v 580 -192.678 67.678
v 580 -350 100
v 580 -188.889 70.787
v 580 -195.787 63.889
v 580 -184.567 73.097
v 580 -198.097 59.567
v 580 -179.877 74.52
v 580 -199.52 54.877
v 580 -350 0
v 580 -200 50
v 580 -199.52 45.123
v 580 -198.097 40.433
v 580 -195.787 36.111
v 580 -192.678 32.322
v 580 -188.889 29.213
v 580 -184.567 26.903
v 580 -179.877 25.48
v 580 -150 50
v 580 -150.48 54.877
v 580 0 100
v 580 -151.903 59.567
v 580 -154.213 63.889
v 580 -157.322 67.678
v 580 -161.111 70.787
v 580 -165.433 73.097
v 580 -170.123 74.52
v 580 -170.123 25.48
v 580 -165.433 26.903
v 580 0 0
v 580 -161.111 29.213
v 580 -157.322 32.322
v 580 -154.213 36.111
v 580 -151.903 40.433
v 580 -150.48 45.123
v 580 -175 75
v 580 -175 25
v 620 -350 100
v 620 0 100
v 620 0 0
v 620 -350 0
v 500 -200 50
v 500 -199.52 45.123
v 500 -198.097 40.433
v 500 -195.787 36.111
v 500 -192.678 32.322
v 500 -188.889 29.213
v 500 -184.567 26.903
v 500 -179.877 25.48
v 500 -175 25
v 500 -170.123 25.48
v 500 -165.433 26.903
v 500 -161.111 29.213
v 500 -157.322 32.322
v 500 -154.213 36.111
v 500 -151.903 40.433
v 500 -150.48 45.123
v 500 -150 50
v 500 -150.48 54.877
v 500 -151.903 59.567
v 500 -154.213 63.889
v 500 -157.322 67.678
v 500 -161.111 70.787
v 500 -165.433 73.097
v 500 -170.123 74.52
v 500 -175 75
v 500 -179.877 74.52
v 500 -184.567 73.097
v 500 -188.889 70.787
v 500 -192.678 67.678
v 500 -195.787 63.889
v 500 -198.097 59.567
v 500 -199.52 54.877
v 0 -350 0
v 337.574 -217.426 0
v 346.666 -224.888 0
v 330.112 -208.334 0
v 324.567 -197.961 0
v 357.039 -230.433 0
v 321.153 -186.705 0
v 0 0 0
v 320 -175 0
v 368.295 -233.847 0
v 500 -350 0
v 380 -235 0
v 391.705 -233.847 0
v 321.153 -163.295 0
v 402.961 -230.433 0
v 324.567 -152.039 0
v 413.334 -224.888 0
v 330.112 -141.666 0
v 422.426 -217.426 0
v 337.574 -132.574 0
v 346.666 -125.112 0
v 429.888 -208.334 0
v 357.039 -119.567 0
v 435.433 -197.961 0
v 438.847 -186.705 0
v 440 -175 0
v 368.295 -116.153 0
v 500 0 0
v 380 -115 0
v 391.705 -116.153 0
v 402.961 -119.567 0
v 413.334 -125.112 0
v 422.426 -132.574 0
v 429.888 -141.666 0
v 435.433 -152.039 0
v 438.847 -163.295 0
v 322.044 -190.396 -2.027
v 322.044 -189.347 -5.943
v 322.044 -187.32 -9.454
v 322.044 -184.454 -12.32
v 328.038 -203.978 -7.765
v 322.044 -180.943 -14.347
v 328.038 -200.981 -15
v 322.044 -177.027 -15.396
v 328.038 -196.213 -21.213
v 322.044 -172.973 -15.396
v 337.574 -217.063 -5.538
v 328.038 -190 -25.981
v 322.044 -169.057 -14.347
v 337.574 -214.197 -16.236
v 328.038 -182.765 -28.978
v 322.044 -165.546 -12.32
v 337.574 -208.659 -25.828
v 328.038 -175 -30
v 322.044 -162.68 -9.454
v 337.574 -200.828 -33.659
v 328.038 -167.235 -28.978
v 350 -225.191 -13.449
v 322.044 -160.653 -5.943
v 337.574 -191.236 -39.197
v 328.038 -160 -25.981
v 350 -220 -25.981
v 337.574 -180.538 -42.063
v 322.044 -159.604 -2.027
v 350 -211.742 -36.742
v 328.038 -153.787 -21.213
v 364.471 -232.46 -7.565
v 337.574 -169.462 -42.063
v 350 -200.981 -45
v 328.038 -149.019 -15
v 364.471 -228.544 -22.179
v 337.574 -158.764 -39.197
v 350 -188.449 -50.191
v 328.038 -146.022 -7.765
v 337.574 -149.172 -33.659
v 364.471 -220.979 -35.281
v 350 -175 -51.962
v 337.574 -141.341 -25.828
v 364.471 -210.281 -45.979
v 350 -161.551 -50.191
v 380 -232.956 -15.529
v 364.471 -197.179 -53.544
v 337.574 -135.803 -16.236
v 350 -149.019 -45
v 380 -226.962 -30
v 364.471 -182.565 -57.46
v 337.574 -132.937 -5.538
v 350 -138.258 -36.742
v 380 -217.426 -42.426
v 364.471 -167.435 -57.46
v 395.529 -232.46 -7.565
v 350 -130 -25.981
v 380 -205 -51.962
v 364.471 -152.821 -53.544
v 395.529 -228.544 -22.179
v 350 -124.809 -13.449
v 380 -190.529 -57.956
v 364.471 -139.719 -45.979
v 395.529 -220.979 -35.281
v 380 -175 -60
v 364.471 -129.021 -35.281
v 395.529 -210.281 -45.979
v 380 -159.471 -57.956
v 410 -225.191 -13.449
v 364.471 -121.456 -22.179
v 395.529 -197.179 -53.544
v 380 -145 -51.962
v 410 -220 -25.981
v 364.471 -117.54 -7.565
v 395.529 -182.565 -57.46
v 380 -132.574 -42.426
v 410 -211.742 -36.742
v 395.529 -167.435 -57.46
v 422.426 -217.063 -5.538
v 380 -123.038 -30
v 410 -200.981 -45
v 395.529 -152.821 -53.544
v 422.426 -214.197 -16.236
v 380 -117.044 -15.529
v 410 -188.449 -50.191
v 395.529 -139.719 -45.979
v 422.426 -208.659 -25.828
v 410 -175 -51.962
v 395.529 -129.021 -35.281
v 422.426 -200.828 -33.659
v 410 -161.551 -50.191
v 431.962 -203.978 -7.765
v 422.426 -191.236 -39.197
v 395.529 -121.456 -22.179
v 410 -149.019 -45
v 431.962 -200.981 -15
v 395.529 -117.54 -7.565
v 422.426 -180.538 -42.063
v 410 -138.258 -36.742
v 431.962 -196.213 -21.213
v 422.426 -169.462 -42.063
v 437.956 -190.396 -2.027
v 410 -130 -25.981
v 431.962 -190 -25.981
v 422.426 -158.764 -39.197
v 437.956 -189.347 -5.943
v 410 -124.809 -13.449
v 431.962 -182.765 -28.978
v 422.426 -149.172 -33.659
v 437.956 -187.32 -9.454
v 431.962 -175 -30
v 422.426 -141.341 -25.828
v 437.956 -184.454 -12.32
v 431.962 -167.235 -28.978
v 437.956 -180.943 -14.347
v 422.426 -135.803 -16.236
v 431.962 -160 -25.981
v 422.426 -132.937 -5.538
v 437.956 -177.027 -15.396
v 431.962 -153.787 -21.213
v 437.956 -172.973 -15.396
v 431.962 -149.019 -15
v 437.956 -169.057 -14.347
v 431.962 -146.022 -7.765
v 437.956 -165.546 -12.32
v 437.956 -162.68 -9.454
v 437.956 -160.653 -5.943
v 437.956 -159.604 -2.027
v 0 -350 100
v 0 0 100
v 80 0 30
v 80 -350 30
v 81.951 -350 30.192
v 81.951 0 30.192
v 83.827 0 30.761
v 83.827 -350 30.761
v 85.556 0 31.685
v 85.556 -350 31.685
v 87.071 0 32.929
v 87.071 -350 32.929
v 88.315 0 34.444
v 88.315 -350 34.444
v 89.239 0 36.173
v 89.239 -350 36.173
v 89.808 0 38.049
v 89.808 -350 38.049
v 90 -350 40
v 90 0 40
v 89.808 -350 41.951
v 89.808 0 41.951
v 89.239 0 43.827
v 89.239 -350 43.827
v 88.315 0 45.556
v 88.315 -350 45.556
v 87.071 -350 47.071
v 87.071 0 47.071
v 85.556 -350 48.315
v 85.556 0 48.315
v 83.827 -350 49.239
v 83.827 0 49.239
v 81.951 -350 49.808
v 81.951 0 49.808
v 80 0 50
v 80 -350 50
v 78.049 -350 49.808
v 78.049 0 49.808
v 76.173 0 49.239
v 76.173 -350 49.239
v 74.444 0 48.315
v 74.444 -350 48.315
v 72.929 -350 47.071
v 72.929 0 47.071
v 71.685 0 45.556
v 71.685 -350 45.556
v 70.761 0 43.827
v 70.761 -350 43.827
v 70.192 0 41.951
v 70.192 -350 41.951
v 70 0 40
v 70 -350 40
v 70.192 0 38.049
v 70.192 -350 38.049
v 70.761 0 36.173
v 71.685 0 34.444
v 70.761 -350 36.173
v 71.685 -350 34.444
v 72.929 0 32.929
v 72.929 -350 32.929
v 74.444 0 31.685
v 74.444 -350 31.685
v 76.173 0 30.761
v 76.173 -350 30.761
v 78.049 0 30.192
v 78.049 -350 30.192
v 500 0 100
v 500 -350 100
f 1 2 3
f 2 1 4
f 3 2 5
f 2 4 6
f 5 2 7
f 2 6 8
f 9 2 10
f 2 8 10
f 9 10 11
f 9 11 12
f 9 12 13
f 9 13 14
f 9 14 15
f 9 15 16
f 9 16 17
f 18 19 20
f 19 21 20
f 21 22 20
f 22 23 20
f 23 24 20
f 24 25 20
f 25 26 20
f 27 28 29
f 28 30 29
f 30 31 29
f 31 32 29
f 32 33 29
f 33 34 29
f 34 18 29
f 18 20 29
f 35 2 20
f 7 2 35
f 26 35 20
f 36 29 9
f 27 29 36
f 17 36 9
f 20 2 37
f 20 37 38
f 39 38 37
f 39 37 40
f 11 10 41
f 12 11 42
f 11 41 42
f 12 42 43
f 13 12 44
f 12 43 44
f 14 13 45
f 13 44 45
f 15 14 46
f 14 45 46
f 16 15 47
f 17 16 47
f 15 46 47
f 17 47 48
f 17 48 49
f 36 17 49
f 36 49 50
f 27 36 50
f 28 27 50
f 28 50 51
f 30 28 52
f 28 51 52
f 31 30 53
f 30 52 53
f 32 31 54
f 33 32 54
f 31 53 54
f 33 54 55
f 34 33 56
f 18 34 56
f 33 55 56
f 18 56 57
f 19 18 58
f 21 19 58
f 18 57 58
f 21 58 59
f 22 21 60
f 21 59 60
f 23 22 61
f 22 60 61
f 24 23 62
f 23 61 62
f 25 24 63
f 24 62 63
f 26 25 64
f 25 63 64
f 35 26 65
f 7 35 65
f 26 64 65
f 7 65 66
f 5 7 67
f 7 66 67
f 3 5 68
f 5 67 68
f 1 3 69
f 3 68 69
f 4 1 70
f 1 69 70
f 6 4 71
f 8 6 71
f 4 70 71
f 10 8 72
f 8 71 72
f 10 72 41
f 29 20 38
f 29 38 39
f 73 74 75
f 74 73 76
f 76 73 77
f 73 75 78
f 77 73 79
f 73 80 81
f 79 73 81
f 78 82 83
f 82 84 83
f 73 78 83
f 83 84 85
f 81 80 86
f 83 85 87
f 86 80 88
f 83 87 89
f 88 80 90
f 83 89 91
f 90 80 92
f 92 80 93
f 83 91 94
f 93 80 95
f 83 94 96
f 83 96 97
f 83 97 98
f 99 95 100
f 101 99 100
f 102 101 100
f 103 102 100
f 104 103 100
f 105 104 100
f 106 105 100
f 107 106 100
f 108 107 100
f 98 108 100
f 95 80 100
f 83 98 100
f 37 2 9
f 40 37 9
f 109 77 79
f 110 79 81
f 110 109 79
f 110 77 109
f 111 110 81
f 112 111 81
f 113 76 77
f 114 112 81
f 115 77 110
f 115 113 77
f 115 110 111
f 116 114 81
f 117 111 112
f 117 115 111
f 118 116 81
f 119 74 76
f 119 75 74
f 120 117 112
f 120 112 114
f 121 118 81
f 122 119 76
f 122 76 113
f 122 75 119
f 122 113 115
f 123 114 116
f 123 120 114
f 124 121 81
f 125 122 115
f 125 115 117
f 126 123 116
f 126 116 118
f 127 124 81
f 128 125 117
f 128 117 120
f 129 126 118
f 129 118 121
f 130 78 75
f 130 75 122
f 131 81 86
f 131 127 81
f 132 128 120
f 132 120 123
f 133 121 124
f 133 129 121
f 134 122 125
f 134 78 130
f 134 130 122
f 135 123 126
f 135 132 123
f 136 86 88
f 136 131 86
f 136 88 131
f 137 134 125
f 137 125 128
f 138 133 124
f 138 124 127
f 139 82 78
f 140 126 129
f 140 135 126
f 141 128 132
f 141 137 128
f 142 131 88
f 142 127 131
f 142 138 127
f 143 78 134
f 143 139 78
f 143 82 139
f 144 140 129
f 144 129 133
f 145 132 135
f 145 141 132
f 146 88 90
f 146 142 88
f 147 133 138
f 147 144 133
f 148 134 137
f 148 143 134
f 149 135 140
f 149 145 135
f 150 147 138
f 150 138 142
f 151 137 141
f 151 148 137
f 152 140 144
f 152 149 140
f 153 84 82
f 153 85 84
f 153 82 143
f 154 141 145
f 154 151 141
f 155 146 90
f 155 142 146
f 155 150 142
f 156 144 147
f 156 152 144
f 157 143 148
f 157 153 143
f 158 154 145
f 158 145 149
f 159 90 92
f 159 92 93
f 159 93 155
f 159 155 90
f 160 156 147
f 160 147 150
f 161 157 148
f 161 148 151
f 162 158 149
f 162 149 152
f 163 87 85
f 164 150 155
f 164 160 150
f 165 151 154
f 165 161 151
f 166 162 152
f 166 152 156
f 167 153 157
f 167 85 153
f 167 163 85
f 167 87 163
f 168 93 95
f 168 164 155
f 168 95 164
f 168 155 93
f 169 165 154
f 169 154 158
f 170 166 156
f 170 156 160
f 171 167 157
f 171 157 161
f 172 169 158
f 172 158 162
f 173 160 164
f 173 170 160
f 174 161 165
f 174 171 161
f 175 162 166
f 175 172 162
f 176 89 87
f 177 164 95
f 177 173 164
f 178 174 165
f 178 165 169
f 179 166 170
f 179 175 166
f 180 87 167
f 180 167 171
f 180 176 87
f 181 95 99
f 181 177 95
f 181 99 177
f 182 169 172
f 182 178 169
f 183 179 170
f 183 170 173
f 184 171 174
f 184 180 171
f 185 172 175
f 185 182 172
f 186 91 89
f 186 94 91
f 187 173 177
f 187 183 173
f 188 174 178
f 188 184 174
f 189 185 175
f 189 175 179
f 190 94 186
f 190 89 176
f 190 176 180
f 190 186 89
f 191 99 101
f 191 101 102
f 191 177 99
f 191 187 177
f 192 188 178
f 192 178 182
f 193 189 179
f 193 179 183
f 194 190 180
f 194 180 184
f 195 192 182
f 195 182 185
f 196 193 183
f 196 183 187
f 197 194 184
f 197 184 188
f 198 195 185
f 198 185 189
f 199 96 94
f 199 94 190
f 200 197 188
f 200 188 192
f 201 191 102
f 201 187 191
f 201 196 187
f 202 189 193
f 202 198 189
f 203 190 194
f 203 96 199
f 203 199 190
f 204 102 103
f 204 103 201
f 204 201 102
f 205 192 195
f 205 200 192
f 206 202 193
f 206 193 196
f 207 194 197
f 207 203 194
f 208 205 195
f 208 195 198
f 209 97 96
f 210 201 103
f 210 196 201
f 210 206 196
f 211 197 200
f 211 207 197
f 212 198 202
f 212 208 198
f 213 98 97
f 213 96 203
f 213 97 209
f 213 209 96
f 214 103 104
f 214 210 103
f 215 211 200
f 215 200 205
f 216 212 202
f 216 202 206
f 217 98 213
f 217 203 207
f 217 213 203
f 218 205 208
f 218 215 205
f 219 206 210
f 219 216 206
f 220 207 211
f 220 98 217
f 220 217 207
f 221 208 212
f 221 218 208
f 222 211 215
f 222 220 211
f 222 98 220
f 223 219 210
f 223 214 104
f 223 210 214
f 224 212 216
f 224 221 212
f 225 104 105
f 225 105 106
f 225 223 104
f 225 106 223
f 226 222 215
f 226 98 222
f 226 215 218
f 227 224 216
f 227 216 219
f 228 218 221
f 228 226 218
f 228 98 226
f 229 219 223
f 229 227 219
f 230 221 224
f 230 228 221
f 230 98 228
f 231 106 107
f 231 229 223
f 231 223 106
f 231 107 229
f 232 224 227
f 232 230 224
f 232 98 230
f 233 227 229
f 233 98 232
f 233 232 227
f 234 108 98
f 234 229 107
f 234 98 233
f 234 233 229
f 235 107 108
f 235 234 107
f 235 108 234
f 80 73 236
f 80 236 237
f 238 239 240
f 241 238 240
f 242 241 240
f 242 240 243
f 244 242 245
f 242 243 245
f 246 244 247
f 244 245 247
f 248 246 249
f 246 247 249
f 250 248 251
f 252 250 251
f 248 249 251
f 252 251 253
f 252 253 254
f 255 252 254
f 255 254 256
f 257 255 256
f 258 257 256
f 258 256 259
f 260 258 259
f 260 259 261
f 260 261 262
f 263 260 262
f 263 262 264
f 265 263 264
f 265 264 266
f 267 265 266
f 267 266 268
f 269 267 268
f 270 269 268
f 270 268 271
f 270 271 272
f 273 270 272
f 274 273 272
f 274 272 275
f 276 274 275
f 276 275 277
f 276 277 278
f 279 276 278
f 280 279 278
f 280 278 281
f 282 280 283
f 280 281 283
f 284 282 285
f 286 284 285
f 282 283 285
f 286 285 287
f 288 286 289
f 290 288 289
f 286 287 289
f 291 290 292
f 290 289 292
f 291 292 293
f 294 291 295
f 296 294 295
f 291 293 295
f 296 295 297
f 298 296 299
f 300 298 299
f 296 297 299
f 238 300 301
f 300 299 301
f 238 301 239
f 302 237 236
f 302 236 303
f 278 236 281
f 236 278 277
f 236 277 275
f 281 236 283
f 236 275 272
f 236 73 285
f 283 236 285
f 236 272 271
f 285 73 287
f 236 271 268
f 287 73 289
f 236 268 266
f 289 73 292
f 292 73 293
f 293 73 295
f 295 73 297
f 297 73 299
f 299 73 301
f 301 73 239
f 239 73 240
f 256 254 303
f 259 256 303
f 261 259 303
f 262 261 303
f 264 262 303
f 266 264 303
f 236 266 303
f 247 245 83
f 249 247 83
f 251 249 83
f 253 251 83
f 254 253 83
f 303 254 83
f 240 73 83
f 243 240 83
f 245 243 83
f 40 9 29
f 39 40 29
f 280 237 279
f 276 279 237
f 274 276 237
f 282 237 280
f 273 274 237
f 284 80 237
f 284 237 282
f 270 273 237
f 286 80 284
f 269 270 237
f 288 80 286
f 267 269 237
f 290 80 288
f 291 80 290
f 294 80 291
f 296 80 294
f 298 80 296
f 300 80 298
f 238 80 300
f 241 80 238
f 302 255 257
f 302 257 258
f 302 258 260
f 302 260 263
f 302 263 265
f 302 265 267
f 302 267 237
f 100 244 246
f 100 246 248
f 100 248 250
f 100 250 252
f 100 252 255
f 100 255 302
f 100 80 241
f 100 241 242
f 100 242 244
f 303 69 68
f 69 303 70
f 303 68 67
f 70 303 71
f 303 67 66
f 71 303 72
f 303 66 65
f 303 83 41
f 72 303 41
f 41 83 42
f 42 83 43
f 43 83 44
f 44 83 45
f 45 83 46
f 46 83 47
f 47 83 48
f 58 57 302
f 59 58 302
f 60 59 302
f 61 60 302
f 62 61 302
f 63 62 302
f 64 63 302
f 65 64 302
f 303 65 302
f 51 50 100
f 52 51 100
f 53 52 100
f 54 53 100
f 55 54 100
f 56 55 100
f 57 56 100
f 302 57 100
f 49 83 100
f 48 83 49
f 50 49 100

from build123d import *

# Parameters (mm, degrees)
SKETCH1_W           = 500
SKETCH1_H           = 350
BOSS_EXTRUDE1_DEPTH = 100
SKETCH2_R           = 10
CUT_EXTRUDE1_DEPTH  = 619.465843843
REVOLVE1_ANGLE      = 180
SKETCH4_R           = 25
BOSS_EXTRUDE2_DEPTH = 80
SKETCH5_W           = 100
SKETCH5_H           = 350
BOSS_EXTRUDE3_DEPTH = 40


with BuildPart() as part:
    # Sketch1 → Boss-Extrude1 (new body)
    with BuildSketch(Plane.XY):
        with Locations((250, -175)):
            Rectangle(SKETCH1_W, SKETCH1_H)
    extrude(amount=BOSS_EXTRUDE1_DEPTH)

    # Sketch2 → Cut-Extrude1 (cut, through all)
    with BuildSketch(Plane.XZ.offset(350)):
        with Locations(Location((80, 40, 0), (0, 0, 270))):
            Circle(SKETCH2_R)
    extrude(amount=-CUT_EXTRUDE1_DEPTH, mode=Mode.SUBTRACT)

    # Sketch3 → Revolve1 (revolve)
    with BuildSketch(Plane(origin=(0, 0, 0), x_dir=(-1, 0, 0), z_dir=(0, 0, -1))):
        with BuildLine():
            Line((-440, -175), (-320, -175))
            ThreePointArc((-320, -175), (-380, -235), (-440, -175))
        make_face()
    revolve(axis=Axis((500, -175, 0), (1, 0, 0)), revolution_arc=REVOLVE1_ANGLE)

    # Sketch4 → Boss-Extrude2 (add)
    with BuildSketch(Plane(origin=(500, 0, 0), x_dir=(0, 0, -1), z_dir=(1, 0, 0))):
        with Locations(Location((-50, -175, 0), (0, 0, 270))):
            Circle(SKETCH4_R)
    extrude(amount=BOSS_EXTRUDE2_DEPTH)

    # Sketch5 → Boss-Extrude3 (add)
    with BuildSketch(Plane(origin=(580, 0, 0), x_dir=(0, 0, -1), z_dir=(1, 0, 0))):
        with Locations((-50, -175)):
            Rectangle(SKETCH5_W, SKETCH5_H)
    extrude(amount=BOSS_EXTRUDE3_DEPTH)


solid = part.part
